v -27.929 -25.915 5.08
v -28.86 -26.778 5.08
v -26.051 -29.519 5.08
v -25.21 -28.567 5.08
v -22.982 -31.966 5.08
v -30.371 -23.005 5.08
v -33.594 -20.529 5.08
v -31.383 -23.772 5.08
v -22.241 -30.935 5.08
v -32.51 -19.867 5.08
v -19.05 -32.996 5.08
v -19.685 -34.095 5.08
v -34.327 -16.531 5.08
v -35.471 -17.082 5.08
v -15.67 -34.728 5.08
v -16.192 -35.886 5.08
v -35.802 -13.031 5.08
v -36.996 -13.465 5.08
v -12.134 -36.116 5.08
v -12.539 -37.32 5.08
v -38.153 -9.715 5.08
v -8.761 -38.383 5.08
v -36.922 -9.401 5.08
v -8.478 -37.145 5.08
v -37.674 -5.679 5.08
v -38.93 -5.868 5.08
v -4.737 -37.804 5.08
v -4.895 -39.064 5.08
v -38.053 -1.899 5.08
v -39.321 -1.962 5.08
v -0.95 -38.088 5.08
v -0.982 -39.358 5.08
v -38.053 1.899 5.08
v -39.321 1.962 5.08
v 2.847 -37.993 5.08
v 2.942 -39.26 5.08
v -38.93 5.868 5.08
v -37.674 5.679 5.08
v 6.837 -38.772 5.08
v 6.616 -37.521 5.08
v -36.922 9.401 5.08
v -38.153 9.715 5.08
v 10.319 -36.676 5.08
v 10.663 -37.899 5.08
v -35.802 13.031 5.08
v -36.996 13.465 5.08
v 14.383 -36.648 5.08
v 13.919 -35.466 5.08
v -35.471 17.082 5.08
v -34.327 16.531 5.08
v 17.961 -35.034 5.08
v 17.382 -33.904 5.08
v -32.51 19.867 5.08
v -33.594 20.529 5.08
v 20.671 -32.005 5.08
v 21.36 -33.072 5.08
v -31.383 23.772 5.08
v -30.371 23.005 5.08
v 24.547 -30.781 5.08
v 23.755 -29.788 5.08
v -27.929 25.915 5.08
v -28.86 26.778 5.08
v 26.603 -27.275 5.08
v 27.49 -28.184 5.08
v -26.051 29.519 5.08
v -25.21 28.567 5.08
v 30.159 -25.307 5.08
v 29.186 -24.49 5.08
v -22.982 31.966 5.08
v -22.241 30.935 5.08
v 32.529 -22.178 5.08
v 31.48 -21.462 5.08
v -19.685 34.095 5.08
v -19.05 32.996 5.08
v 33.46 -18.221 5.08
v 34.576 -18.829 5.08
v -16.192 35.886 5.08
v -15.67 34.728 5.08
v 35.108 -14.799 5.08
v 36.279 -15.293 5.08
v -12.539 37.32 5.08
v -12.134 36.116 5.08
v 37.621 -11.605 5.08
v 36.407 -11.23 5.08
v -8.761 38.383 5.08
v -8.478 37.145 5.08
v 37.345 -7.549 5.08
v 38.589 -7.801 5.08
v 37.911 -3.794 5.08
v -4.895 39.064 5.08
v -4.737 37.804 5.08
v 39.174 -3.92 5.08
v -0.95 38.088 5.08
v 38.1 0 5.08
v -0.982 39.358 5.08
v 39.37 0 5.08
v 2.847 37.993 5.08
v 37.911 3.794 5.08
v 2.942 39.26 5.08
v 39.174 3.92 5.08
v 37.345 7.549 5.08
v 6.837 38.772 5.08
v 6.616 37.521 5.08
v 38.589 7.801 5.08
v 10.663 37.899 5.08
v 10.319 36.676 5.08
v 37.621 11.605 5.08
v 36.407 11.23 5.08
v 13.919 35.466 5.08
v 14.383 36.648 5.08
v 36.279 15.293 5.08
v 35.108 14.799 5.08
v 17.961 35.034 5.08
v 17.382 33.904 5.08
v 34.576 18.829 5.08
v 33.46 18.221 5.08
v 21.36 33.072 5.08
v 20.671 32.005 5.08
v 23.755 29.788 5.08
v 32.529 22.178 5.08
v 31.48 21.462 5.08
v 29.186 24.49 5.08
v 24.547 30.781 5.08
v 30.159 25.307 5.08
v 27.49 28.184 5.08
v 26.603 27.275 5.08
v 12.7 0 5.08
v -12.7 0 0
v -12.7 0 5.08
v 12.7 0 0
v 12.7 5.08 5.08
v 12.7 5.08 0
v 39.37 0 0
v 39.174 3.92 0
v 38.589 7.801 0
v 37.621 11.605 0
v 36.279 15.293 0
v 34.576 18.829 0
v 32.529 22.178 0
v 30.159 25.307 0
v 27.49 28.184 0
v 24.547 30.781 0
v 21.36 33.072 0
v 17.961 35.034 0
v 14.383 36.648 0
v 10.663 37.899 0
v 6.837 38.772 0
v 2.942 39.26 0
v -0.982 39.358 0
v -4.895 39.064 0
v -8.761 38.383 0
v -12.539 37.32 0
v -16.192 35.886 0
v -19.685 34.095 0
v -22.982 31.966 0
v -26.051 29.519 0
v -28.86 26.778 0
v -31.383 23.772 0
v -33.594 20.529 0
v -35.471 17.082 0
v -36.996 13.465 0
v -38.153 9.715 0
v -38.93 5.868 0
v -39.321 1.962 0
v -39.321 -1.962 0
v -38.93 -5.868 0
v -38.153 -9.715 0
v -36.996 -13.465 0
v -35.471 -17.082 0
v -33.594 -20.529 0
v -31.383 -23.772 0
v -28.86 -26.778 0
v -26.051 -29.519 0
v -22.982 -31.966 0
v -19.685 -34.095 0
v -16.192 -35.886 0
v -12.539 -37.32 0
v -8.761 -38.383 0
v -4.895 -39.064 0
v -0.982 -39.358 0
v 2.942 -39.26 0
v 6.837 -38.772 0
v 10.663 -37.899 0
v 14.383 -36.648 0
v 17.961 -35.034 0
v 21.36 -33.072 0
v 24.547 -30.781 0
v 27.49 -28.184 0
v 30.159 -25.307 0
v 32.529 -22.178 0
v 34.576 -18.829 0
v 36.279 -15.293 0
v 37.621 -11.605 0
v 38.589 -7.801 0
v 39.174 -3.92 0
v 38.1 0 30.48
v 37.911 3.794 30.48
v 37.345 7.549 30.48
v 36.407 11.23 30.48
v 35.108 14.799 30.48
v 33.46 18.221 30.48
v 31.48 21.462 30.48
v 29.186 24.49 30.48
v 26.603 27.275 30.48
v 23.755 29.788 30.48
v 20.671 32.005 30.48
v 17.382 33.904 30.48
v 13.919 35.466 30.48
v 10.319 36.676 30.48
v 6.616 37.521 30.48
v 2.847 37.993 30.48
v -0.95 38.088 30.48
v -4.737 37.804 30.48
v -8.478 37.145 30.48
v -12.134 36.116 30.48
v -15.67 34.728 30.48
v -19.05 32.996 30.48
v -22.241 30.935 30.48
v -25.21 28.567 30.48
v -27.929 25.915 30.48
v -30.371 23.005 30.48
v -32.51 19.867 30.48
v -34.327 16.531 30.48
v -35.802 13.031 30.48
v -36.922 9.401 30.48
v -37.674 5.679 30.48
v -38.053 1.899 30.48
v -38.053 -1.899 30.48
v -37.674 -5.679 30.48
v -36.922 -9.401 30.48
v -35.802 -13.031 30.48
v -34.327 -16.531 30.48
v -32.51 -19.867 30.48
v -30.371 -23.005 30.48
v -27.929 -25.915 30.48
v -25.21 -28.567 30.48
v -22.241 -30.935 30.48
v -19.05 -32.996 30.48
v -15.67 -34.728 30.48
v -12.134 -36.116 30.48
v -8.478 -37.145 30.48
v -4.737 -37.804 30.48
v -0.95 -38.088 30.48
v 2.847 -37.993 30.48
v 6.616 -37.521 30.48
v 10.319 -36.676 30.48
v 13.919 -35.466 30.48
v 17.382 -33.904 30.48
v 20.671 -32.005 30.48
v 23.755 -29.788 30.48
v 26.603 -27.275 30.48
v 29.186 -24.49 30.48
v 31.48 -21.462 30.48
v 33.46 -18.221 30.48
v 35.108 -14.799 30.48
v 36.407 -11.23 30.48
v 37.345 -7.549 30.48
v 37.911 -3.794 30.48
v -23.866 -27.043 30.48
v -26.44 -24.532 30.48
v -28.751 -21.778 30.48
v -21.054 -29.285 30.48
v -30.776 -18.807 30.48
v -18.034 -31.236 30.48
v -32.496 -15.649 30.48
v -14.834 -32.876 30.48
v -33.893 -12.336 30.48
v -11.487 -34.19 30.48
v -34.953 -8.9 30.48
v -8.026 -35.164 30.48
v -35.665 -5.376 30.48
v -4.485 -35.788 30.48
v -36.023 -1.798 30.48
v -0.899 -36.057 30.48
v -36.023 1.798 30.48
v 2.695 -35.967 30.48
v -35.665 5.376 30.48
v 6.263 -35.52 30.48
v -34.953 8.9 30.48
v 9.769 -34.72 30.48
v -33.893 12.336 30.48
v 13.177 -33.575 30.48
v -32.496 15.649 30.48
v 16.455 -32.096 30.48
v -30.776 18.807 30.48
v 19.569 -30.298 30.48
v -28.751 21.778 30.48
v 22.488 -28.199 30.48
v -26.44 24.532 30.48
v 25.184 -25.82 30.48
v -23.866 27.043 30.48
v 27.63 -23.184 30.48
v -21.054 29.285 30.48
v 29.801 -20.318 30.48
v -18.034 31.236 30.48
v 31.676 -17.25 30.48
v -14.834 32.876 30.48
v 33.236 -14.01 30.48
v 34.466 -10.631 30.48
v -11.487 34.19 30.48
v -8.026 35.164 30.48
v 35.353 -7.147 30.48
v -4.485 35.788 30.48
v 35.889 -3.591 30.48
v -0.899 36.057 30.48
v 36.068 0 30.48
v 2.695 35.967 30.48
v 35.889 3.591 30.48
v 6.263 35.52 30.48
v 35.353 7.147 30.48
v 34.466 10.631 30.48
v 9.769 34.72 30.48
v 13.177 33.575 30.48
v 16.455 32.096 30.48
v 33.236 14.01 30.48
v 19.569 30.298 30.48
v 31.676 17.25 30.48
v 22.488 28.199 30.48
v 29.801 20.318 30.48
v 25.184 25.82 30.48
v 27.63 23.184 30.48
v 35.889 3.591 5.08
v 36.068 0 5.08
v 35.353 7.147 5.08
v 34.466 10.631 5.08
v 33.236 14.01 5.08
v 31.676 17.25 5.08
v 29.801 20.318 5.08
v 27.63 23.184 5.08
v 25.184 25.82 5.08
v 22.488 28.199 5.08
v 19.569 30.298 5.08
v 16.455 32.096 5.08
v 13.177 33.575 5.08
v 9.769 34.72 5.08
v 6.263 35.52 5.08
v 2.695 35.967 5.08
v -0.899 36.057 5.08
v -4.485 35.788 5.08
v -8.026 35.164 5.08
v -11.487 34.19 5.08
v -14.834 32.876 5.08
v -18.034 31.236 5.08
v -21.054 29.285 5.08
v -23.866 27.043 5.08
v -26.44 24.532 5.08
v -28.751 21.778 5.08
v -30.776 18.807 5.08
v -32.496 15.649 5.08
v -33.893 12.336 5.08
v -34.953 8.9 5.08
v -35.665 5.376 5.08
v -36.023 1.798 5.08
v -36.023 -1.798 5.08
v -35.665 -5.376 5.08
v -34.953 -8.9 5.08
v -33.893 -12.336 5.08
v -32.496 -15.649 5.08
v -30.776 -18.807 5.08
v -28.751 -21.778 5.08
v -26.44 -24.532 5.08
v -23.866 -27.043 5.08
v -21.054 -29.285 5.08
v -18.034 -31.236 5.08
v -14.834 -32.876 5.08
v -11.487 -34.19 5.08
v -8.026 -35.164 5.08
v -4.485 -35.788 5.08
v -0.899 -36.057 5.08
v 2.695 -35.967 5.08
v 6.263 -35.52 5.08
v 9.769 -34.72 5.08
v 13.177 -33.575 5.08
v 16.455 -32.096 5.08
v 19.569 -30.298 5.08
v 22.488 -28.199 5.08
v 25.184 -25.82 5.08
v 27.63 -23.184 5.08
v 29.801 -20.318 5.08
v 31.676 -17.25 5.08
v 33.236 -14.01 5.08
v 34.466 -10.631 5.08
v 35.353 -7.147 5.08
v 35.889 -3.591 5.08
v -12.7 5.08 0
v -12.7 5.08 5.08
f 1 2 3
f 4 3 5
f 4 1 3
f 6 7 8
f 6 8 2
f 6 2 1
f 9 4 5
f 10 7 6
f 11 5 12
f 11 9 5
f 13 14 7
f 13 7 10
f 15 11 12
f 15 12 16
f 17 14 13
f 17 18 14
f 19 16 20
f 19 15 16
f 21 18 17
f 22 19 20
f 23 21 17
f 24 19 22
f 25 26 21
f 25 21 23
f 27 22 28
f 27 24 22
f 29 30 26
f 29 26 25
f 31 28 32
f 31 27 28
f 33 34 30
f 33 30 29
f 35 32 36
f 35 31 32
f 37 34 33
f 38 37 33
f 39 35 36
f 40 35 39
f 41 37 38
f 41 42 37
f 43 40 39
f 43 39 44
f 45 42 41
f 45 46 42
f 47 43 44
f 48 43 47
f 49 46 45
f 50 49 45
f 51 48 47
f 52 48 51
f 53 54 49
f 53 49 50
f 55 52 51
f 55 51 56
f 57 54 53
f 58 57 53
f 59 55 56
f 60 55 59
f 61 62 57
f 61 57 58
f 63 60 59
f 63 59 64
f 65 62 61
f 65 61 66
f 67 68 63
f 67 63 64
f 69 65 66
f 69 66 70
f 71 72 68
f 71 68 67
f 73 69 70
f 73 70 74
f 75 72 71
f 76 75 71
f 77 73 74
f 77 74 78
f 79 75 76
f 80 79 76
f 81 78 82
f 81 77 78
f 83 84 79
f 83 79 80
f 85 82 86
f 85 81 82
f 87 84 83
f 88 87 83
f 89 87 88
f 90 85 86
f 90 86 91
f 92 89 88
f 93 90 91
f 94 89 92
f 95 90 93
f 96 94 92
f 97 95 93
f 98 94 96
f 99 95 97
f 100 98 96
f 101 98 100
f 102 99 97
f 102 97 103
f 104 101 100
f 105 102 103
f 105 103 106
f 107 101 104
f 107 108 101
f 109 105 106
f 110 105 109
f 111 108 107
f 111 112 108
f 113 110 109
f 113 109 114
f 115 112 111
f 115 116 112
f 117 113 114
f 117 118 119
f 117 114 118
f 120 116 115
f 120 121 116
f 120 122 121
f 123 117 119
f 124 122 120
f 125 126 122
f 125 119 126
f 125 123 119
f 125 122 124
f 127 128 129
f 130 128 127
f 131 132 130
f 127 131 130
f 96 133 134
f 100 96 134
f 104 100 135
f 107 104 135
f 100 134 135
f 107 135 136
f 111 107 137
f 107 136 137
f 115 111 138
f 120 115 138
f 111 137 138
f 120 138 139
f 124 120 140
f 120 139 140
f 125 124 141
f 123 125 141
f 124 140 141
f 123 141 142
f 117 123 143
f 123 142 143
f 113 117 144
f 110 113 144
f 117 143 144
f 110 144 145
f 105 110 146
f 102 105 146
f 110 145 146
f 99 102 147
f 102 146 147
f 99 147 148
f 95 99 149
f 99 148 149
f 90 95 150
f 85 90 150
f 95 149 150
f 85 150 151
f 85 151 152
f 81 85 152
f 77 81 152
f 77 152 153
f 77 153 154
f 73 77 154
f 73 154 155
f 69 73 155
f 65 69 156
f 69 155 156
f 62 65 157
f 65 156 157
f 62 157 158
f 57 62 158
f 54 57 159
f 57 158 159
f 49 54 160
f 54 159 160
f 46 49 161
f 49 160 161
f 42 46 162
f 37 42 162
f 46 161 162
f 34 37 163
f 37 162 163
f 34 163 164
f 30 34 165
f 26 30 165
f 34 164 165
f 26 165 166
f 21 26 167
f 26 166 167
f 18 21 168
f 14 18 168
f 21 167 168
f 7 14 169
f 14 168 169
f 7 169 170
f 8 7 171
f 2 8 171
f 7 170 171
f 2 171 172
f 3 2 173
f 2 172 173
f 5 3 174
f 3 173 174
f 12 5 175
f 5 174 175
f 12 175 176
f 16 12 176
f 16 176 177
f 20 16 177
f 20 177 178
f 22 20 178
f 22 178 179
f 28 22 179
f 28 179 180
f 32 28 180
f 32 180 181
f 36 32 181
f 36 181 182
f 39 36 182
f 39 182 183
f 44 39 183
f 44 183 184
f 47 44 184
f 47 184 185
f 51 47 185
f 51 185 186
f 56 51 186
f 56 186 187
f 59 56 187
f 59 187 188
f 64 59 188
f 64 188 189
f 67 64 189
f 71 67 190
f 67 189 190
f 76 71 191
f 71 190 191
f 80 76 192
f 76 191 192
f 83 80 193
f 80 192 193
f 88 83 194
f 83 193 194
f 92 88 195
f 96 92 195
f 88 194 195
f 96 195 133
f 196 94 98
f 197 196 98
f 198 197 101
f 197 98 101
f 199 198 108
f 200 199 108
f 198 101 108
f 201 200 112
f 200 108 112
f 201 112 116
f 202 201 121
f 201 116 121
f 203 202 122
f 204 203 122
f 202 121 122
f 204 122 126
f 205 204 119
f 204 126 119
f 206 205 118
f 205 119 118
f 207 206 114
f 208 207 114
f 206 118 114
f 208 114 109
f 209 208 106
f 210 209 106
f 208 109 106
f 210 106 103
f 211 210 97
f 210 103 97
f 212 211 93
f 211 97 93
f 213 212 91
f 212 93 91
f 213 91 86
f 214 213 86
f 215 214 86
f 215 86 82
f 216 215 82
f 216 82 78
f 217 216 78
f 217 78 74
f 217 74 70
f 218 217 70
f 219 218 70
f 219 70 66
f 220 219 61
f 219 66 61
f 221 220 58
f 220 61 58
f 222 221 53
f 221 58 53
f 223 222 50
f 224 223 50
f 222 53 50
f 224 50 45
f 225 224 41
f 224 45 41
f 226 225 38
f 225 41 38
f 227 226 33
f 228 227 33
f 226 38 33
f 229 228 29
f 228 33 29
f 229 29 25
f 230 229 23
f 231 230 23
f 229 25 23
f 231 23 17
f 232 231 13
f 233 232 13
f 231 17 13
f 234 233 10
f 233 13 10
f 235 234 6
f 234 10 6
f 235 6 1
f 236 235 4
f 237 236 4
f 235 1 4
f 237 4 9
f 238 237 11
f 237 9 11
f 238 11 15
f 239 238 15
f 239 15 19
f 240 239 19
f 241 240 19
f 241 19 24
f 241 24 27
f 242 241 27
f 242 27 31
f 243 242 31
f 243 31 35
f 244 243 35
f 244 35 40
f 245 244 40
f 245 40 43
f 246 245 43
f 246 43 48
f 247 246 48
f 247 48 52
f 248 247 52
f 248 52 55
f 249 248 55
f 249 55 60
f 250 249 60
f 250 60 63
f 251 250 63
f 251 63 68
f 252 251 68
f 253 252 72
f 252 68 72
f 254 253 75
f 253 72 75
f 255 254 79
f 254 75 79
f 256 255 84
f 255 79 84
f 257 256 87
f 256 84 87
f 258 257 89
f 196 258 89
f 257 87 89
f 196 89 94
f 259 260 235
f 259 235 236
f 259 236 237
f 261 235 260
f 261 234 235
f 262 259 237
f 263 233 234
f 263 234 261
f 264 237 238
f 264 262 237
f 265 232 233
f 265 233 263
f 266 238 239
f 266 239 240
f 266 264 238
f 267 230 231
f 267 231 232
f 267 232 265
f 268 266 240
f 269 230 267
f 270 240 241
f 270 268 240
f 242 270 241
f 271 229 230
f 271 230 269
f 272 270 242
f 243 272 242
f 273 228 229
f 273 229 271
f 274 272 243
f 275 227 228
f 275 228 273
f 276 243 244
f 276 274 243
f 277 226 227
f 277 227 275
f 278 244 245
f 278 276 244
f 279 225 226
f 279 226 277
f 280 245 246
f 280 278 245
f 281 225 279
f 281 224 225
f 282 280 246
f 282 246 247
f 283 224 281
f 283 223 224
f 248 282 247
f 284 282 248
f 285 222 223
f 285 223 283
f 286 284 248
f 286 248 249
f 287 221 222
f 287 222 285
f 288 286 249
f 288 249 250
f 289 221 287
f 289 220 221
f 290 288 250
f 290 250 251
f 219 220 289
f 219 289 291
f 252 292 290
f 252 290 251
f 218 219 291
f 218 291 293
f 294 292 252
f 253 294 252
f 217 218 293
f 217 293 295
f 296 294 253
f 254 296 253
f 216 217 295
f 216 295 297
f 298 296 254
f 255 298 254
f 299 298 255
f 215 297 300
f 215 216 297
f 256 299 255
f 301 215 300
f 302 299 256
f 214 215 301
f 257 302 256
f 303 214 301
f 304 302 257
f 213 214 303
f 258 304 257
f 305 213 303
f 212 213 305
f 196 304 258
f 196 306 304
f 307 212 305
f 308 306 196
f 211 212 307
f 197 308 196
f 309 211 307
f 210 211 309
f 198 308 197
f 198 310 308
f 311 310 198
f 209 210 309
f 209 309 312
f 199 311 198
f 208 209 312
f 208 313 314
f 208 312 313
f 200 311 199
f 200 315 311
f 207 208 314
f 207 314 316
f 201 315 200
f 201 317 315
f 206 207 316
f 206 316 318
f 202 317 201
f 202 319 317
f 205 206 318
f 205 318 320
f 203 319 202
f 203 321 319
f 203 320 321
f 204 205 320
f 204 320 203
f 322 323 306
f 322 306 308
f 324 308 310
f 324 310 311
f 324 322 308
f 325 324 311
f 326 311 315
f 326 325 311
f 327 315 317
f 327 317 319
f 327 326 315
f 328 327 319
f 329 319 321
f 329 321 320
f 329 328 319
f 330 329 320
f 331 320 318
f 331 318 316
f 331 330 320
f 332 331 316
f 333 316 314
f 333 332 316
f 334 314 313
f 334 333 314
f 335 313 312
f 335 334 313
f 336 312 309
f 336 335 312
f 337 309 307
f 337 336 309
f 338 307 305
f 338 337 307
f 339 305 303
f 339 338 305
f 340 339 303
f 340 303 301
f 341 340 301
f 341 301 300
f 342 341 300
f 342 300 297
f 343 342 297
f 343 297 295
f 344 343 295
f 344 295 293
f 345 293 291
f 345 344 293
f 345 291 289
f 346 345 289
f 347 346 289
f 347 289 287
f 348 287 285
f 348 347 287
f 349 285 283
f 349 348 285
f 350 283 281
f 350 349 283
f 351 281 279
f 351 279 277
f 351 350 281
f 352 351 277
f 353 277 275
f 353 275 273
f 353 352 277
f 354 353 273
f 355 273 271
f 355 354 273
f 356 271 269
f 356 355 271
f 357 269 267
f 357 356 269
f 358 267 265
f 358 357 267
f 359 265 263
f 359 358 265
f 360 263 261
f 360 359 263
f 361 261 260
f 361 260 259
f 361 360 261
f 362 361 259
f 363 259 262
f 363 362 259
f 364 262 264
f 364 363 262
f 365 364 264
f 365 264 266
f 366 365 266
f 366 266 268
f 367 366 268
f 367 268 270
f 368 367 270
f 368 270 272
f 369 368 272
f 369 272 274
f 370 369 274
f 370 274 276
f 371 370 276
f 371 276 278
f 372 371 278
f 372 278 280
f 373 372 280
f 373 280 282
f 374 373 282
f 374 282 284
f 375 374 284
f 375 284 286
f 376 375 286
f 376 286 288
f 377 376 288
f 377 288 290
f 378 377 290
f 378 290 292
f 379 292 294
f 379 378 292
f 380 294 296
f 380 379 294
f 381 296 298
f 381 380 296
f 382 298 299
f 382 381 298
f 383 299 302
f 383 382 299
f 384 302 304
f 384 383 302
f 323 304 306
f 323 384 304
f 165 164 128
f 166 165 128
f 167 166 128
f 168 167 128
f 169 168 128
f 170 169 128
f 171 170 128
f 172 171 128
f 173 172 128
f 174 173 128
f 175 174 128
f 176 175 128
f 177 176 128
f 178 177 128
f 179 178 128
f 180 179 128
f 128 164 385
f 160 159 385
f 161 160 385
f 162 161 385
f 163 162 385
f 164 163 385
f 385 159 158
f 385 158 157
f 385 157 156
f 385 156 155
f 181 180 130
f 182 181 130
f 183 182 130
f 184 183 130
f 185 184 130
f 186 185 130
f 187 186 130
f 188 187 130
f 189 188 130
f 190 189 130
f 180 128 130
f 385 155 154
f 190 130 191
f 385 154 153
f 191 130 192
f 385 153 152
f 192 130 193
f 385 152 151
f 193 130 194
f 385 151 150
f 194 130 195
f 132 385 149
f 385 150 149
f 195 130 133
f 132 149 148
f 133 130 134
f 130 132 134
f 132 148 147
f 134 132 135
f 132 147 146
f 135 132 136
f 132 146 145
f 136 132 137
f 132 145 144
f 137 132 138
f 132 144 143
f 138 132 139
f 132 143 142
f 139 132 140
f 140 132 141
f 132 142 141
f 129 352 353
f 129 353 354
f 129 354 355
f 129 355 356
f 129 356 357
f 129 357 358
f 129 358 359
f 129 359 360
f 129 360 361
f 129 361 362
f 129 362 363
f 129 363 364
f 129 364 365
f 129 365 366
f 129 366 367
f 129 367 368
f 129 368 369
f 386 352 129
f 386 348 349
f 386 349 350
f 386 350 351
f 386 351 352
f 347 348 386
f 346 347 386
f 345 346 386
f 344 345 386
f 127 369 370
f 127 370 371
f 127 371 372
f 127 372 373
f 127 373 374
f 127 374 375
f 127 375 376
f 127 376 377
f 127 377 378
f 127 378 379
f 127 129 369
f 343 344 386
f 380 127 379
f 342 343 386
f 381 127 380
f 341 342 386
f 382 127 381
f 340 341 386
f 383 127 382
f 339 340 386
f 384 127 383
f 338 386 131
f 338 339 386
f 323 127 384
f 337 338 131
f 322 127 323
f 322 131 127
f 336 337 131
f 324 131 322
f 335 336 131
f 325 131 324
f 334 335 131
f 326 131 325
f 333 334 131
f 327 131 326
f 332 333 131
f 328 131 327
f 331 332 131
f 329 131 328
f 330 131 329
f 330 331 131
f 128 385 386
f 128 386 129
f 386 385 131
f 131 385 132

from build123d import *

# Parameters (mm, degrees)
F0_R     = 39.37
F1_DEPTH = 5.08
F2_R     = 38.1
F2_R_2   = 36.068
F3_DEPTH = 25.4
F4_W     = 25.4
F4_H     = 5.08
F5_DEPTH = 5.08


with BuildPart() as f1:
    # F0 (on Top) → F1 (new body)
    with BuildSketch(Plane.XY):
        Circle(F0_R)
    extrude(amount=F1_DEPTH)

    # F2 (on face) → F3 (join)
    with BuildSketch(Plane.XY.offset(5.08)):
        Circle(F2_R)
        Circle(F2_R_2, mode=Mode.SUBTRACT)
    extrude(amount=F3_DEPTH)

    # F4 (on face) → F5 (cut)
    with BuildSketch(Plane(origin=(0, 0, 0), x_dir=(1, 0, 0), z_dir=(0, 0, -1))):
        with Locations((0, -2.54)):
            Rectangle(F4_W, F4_H)
    extrude(amount=-F5_DEPTH, mode=Mode.SUBTRACT)


solid = f1.part
